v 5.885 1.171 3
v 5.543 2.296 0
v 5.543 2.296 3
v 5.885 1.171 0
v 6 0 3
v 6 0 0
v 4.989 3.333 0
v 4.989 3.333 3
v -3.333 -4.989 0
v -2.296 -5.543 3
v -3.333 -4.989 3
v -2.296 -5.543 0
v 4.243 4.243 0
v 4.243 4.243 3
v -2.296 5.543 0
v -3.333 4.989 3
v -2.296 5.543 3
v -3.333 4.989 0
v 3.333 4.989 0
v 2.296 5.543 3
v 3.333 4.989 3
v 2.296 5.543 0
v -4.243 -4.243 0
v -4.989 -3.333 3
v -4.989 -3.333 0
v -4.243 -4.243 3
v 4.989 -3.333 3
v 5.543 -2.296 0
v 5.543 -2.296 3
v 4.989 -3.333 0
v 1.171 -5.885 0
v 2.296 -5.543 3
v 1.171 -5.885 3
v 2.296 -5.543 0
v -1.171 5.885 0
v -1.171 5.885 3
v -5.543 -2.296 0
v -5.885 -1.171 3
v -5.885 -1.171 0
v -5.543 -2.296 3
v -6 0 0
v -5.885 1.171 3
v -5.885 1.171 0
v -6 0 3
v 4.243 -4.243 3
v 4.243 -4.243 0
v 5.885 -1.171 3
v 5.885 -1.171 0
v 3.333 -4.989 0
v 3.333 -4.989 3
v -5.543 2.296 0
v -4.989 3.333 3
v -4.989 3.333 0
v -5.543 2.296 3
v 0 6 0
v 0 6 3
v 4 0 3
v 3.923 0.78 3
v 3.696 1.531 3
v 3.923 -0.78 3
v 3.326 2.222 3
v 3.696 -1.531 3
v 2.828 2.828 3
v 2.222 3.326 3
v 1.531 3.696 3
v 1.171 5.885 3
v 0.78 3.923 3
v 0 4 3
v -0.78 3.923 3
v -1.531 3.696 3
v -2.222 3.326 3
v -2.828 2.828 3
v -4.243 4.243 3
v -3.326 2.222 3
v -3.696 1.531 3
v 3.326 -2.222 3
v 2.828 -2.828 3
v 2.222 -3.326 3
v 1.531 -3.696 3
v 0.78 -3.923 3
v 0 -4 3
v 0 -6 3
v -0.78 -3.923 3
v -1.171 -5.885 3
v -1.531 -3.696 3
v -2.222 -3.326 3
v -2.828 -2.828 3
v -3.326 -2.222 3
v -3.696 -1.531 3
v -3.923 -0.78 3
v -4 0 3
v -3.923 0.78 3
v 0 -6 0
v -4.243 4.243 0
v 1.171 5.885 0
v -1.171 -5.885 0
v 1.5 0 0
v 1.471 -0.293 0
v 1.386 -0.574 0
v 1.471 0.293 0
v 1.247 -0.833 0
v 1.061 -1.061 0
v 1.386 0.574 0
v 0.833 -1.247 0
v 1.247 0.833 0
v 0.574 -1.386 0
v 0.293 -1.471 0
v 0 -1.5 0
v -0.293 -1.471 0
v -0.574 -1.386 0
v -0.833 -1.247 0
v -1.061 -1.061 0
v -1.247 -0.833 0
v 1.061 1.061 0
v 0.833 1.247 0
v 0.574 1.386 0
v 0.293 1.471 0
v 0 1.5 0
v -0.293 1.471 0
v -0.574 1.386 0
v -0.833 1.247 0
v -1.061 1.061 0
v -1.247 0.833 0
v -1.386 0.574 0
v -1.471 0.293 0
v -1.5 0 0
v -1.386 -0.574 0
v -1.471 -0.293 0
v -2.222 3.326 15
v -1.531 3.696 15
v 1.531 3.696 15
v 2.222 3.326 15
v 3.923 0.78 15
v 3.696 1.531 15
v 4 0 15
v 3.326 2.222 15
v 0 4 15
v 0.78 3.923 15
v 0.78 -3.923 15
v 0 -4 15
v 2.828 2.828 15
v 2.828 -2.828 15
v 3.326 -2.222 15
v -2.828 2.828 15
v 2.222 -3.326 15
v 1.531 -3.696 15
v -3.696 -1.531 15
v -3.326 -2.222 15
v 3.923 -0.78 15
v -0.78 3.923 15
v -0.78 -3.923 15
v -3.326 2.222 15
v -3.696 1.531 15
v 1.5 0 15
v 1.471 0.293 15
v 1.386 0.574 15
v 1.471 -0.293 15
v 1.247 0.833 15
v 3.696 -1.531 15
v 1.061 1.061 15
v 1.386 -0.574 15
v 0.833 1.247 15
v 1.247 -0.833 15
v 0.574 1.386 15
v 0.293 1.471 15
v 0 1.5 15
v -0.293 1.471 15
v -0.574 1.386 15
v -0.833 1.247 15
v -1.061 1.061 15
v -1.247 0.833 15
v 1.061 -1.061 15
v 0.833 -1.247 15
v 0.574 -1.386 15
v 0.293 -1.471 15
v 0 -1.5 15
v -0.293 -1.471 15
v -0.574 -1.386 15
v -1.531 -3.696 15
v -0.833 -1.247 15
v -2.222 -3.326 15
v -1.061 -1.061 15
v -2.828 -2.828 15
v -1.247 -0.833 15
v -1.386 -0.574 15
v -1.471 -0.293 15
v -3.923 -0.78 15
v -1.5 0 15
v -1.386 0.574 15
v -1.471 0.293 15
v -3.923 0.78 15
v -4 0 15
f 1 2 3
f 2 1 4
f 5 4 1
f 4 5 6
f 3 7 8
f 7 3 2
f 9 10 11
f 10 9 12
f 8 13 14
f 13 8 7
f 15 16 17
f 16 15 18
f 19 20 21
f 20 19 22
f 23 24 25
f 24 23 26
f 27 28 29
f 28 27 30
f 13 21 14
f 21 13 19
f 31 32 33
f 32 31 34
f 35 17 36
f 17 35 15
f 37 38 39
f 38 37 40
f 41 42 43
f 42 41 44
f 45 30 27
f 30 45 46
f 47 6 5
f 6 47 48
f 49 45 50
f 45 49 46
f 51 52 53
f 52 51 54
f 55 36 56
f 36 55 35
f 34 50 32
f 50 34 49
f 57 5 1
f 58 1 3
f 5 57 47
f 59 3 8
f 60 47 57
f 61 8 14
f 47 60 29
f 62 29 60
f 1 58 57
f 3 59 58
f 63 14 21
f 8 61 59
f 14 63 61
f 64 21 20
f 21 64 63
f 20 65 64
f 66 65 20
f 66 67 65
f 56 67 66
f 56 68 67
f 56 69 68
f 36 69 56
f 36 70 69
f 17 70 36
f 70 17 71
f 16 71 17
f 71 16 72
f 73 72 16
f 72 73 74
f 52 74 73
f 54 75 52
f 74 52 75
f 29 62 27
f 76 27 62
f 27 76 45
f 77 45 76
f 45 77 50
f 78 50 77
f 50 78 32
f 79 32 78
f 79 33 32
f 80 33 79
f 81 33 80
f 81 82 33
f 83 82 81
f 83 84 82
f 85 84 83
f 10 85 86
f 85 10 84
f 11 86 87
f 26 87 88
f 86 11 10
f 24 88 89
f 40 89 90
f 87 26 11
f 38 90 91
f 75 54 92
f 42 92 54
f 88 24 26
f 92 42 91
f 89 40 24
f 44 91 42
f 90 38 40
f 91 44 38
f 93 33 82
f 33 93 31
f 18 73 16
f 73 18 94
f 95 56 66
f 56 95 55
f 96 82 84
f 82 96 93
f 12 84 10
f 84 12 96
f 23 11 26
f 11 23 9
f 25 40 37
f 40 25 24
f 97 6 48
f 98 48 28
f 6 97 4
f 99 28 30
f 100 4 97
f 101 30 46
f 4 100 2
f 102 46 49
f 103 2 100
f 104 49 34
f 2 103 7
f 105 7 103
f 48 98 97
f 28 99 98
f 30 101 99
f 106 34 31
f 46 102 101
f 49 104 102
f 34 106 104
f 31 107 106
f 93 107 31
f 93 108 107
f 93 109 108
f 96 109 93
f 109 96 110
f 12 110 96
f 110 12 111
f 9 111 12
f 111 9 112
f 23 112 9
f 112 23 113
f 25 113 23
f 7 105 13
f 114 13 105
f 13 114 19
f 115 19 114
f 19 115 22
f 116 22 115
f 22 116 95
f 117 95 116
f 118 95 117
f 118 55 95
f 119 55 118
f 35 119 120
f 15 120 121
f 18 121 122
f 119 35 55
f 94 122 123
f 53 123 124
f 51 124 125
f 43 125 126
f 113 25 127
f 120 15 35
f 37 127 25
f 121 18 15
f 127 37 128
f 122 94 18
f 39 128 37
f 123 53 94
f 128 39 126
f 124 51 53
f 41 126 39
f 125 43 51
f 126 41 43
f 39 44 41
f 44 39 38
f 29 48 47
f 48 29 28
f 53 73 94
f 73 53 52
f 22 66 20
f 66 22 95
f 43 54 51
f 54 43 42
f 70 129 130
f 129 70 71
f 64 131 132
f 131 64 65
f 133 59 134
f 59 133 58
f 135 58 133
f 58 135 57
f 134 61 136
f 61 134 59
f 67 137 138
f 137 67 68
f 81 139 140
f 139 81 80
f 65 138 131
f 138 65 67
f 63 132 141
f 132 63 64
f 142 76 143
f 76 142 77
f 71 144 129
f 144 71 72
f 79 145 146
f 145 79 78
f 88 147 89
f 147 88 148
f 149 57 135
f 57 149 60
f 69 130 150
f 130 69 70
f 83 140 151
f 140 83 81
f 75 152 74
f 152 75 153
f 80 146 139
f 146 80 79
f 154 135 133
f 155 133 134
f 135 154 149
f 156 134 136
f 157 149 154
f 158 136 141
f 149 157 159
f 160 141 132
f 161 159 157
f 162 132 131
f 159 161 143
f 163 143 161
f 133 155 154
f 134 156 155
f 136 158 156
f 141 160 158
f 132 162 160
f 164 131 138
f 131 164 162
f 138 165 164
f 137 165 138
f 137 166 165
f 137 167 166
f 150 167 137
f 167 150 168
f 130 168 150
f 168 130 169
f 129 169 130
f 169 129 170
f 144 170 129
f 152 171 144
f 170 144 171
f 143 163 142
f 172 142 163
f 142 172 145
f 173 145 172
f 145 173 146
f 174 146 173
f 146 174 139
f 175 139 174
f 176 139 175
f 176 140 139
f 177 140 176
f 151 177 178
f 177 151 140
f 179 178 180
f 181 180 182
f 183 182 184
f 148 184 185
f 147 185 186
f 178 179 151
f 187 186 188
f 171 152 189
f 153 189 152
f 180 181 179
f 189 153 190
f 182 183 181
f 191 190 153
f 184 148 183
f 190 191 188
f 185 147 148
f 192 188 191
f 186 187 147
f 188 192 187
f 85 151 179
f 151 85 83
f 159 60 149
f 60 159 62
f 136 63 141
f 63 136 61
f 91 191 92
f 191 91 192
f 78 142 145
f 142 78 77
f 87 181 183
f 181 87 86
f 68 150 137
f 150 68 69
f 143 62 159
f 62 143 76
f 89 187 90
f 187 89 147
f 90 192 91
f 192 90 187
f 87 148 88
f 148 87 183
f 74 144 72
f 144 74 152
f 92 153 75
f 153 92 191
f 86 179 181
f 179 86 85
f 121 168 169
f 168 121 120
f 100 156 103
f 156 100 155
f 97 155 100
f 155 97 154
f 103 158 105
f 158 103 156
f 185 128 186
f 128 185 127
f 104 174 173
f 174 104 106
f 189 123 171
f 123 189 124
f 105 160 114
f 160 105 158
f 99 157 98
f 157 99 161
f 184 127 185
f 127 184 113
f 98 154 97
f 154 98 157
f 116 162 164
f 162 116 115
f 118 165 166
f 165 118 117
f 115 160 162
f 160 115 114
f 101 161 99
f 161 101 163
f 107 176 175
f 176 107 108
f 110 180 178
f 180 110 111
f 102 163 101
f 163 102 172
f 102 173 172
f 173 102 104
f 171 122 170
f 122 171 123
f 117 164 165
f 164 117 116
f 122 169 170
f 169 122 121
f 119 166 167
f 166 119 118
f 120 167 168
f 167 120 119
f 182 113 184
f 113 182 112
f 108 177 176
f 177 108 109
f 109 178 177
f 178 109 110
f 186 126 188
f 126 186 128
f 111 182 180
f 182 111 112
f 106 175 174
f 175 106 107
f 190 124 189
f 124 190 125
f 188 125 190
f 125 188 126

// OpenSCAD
$fn = 32;

// ----------------------------------------------------------------------
// Micro post: flanged post, 5-20 mm class
// ----------------------------------------------------------------------

// --- parameters (mm) ---
post_d = 8;               // post diameter
post_h = 12;              // post height above the flange
flange_d = 12;            // flange diameter
flange_t = 3;             // flange thickness
bore_d = 3;               // through bore

total_h = post_h + flange_t;  // overall height

difference() {
  union() {
    cylinder(h = flange_t, d = flange_d);
    translate([0, 0, flange_t]) cylinder(h = post_h, d = post_d);
  }
  translate([0, 0, -1]) cylinder(h = total_h + 2, d = bore_d);
}
